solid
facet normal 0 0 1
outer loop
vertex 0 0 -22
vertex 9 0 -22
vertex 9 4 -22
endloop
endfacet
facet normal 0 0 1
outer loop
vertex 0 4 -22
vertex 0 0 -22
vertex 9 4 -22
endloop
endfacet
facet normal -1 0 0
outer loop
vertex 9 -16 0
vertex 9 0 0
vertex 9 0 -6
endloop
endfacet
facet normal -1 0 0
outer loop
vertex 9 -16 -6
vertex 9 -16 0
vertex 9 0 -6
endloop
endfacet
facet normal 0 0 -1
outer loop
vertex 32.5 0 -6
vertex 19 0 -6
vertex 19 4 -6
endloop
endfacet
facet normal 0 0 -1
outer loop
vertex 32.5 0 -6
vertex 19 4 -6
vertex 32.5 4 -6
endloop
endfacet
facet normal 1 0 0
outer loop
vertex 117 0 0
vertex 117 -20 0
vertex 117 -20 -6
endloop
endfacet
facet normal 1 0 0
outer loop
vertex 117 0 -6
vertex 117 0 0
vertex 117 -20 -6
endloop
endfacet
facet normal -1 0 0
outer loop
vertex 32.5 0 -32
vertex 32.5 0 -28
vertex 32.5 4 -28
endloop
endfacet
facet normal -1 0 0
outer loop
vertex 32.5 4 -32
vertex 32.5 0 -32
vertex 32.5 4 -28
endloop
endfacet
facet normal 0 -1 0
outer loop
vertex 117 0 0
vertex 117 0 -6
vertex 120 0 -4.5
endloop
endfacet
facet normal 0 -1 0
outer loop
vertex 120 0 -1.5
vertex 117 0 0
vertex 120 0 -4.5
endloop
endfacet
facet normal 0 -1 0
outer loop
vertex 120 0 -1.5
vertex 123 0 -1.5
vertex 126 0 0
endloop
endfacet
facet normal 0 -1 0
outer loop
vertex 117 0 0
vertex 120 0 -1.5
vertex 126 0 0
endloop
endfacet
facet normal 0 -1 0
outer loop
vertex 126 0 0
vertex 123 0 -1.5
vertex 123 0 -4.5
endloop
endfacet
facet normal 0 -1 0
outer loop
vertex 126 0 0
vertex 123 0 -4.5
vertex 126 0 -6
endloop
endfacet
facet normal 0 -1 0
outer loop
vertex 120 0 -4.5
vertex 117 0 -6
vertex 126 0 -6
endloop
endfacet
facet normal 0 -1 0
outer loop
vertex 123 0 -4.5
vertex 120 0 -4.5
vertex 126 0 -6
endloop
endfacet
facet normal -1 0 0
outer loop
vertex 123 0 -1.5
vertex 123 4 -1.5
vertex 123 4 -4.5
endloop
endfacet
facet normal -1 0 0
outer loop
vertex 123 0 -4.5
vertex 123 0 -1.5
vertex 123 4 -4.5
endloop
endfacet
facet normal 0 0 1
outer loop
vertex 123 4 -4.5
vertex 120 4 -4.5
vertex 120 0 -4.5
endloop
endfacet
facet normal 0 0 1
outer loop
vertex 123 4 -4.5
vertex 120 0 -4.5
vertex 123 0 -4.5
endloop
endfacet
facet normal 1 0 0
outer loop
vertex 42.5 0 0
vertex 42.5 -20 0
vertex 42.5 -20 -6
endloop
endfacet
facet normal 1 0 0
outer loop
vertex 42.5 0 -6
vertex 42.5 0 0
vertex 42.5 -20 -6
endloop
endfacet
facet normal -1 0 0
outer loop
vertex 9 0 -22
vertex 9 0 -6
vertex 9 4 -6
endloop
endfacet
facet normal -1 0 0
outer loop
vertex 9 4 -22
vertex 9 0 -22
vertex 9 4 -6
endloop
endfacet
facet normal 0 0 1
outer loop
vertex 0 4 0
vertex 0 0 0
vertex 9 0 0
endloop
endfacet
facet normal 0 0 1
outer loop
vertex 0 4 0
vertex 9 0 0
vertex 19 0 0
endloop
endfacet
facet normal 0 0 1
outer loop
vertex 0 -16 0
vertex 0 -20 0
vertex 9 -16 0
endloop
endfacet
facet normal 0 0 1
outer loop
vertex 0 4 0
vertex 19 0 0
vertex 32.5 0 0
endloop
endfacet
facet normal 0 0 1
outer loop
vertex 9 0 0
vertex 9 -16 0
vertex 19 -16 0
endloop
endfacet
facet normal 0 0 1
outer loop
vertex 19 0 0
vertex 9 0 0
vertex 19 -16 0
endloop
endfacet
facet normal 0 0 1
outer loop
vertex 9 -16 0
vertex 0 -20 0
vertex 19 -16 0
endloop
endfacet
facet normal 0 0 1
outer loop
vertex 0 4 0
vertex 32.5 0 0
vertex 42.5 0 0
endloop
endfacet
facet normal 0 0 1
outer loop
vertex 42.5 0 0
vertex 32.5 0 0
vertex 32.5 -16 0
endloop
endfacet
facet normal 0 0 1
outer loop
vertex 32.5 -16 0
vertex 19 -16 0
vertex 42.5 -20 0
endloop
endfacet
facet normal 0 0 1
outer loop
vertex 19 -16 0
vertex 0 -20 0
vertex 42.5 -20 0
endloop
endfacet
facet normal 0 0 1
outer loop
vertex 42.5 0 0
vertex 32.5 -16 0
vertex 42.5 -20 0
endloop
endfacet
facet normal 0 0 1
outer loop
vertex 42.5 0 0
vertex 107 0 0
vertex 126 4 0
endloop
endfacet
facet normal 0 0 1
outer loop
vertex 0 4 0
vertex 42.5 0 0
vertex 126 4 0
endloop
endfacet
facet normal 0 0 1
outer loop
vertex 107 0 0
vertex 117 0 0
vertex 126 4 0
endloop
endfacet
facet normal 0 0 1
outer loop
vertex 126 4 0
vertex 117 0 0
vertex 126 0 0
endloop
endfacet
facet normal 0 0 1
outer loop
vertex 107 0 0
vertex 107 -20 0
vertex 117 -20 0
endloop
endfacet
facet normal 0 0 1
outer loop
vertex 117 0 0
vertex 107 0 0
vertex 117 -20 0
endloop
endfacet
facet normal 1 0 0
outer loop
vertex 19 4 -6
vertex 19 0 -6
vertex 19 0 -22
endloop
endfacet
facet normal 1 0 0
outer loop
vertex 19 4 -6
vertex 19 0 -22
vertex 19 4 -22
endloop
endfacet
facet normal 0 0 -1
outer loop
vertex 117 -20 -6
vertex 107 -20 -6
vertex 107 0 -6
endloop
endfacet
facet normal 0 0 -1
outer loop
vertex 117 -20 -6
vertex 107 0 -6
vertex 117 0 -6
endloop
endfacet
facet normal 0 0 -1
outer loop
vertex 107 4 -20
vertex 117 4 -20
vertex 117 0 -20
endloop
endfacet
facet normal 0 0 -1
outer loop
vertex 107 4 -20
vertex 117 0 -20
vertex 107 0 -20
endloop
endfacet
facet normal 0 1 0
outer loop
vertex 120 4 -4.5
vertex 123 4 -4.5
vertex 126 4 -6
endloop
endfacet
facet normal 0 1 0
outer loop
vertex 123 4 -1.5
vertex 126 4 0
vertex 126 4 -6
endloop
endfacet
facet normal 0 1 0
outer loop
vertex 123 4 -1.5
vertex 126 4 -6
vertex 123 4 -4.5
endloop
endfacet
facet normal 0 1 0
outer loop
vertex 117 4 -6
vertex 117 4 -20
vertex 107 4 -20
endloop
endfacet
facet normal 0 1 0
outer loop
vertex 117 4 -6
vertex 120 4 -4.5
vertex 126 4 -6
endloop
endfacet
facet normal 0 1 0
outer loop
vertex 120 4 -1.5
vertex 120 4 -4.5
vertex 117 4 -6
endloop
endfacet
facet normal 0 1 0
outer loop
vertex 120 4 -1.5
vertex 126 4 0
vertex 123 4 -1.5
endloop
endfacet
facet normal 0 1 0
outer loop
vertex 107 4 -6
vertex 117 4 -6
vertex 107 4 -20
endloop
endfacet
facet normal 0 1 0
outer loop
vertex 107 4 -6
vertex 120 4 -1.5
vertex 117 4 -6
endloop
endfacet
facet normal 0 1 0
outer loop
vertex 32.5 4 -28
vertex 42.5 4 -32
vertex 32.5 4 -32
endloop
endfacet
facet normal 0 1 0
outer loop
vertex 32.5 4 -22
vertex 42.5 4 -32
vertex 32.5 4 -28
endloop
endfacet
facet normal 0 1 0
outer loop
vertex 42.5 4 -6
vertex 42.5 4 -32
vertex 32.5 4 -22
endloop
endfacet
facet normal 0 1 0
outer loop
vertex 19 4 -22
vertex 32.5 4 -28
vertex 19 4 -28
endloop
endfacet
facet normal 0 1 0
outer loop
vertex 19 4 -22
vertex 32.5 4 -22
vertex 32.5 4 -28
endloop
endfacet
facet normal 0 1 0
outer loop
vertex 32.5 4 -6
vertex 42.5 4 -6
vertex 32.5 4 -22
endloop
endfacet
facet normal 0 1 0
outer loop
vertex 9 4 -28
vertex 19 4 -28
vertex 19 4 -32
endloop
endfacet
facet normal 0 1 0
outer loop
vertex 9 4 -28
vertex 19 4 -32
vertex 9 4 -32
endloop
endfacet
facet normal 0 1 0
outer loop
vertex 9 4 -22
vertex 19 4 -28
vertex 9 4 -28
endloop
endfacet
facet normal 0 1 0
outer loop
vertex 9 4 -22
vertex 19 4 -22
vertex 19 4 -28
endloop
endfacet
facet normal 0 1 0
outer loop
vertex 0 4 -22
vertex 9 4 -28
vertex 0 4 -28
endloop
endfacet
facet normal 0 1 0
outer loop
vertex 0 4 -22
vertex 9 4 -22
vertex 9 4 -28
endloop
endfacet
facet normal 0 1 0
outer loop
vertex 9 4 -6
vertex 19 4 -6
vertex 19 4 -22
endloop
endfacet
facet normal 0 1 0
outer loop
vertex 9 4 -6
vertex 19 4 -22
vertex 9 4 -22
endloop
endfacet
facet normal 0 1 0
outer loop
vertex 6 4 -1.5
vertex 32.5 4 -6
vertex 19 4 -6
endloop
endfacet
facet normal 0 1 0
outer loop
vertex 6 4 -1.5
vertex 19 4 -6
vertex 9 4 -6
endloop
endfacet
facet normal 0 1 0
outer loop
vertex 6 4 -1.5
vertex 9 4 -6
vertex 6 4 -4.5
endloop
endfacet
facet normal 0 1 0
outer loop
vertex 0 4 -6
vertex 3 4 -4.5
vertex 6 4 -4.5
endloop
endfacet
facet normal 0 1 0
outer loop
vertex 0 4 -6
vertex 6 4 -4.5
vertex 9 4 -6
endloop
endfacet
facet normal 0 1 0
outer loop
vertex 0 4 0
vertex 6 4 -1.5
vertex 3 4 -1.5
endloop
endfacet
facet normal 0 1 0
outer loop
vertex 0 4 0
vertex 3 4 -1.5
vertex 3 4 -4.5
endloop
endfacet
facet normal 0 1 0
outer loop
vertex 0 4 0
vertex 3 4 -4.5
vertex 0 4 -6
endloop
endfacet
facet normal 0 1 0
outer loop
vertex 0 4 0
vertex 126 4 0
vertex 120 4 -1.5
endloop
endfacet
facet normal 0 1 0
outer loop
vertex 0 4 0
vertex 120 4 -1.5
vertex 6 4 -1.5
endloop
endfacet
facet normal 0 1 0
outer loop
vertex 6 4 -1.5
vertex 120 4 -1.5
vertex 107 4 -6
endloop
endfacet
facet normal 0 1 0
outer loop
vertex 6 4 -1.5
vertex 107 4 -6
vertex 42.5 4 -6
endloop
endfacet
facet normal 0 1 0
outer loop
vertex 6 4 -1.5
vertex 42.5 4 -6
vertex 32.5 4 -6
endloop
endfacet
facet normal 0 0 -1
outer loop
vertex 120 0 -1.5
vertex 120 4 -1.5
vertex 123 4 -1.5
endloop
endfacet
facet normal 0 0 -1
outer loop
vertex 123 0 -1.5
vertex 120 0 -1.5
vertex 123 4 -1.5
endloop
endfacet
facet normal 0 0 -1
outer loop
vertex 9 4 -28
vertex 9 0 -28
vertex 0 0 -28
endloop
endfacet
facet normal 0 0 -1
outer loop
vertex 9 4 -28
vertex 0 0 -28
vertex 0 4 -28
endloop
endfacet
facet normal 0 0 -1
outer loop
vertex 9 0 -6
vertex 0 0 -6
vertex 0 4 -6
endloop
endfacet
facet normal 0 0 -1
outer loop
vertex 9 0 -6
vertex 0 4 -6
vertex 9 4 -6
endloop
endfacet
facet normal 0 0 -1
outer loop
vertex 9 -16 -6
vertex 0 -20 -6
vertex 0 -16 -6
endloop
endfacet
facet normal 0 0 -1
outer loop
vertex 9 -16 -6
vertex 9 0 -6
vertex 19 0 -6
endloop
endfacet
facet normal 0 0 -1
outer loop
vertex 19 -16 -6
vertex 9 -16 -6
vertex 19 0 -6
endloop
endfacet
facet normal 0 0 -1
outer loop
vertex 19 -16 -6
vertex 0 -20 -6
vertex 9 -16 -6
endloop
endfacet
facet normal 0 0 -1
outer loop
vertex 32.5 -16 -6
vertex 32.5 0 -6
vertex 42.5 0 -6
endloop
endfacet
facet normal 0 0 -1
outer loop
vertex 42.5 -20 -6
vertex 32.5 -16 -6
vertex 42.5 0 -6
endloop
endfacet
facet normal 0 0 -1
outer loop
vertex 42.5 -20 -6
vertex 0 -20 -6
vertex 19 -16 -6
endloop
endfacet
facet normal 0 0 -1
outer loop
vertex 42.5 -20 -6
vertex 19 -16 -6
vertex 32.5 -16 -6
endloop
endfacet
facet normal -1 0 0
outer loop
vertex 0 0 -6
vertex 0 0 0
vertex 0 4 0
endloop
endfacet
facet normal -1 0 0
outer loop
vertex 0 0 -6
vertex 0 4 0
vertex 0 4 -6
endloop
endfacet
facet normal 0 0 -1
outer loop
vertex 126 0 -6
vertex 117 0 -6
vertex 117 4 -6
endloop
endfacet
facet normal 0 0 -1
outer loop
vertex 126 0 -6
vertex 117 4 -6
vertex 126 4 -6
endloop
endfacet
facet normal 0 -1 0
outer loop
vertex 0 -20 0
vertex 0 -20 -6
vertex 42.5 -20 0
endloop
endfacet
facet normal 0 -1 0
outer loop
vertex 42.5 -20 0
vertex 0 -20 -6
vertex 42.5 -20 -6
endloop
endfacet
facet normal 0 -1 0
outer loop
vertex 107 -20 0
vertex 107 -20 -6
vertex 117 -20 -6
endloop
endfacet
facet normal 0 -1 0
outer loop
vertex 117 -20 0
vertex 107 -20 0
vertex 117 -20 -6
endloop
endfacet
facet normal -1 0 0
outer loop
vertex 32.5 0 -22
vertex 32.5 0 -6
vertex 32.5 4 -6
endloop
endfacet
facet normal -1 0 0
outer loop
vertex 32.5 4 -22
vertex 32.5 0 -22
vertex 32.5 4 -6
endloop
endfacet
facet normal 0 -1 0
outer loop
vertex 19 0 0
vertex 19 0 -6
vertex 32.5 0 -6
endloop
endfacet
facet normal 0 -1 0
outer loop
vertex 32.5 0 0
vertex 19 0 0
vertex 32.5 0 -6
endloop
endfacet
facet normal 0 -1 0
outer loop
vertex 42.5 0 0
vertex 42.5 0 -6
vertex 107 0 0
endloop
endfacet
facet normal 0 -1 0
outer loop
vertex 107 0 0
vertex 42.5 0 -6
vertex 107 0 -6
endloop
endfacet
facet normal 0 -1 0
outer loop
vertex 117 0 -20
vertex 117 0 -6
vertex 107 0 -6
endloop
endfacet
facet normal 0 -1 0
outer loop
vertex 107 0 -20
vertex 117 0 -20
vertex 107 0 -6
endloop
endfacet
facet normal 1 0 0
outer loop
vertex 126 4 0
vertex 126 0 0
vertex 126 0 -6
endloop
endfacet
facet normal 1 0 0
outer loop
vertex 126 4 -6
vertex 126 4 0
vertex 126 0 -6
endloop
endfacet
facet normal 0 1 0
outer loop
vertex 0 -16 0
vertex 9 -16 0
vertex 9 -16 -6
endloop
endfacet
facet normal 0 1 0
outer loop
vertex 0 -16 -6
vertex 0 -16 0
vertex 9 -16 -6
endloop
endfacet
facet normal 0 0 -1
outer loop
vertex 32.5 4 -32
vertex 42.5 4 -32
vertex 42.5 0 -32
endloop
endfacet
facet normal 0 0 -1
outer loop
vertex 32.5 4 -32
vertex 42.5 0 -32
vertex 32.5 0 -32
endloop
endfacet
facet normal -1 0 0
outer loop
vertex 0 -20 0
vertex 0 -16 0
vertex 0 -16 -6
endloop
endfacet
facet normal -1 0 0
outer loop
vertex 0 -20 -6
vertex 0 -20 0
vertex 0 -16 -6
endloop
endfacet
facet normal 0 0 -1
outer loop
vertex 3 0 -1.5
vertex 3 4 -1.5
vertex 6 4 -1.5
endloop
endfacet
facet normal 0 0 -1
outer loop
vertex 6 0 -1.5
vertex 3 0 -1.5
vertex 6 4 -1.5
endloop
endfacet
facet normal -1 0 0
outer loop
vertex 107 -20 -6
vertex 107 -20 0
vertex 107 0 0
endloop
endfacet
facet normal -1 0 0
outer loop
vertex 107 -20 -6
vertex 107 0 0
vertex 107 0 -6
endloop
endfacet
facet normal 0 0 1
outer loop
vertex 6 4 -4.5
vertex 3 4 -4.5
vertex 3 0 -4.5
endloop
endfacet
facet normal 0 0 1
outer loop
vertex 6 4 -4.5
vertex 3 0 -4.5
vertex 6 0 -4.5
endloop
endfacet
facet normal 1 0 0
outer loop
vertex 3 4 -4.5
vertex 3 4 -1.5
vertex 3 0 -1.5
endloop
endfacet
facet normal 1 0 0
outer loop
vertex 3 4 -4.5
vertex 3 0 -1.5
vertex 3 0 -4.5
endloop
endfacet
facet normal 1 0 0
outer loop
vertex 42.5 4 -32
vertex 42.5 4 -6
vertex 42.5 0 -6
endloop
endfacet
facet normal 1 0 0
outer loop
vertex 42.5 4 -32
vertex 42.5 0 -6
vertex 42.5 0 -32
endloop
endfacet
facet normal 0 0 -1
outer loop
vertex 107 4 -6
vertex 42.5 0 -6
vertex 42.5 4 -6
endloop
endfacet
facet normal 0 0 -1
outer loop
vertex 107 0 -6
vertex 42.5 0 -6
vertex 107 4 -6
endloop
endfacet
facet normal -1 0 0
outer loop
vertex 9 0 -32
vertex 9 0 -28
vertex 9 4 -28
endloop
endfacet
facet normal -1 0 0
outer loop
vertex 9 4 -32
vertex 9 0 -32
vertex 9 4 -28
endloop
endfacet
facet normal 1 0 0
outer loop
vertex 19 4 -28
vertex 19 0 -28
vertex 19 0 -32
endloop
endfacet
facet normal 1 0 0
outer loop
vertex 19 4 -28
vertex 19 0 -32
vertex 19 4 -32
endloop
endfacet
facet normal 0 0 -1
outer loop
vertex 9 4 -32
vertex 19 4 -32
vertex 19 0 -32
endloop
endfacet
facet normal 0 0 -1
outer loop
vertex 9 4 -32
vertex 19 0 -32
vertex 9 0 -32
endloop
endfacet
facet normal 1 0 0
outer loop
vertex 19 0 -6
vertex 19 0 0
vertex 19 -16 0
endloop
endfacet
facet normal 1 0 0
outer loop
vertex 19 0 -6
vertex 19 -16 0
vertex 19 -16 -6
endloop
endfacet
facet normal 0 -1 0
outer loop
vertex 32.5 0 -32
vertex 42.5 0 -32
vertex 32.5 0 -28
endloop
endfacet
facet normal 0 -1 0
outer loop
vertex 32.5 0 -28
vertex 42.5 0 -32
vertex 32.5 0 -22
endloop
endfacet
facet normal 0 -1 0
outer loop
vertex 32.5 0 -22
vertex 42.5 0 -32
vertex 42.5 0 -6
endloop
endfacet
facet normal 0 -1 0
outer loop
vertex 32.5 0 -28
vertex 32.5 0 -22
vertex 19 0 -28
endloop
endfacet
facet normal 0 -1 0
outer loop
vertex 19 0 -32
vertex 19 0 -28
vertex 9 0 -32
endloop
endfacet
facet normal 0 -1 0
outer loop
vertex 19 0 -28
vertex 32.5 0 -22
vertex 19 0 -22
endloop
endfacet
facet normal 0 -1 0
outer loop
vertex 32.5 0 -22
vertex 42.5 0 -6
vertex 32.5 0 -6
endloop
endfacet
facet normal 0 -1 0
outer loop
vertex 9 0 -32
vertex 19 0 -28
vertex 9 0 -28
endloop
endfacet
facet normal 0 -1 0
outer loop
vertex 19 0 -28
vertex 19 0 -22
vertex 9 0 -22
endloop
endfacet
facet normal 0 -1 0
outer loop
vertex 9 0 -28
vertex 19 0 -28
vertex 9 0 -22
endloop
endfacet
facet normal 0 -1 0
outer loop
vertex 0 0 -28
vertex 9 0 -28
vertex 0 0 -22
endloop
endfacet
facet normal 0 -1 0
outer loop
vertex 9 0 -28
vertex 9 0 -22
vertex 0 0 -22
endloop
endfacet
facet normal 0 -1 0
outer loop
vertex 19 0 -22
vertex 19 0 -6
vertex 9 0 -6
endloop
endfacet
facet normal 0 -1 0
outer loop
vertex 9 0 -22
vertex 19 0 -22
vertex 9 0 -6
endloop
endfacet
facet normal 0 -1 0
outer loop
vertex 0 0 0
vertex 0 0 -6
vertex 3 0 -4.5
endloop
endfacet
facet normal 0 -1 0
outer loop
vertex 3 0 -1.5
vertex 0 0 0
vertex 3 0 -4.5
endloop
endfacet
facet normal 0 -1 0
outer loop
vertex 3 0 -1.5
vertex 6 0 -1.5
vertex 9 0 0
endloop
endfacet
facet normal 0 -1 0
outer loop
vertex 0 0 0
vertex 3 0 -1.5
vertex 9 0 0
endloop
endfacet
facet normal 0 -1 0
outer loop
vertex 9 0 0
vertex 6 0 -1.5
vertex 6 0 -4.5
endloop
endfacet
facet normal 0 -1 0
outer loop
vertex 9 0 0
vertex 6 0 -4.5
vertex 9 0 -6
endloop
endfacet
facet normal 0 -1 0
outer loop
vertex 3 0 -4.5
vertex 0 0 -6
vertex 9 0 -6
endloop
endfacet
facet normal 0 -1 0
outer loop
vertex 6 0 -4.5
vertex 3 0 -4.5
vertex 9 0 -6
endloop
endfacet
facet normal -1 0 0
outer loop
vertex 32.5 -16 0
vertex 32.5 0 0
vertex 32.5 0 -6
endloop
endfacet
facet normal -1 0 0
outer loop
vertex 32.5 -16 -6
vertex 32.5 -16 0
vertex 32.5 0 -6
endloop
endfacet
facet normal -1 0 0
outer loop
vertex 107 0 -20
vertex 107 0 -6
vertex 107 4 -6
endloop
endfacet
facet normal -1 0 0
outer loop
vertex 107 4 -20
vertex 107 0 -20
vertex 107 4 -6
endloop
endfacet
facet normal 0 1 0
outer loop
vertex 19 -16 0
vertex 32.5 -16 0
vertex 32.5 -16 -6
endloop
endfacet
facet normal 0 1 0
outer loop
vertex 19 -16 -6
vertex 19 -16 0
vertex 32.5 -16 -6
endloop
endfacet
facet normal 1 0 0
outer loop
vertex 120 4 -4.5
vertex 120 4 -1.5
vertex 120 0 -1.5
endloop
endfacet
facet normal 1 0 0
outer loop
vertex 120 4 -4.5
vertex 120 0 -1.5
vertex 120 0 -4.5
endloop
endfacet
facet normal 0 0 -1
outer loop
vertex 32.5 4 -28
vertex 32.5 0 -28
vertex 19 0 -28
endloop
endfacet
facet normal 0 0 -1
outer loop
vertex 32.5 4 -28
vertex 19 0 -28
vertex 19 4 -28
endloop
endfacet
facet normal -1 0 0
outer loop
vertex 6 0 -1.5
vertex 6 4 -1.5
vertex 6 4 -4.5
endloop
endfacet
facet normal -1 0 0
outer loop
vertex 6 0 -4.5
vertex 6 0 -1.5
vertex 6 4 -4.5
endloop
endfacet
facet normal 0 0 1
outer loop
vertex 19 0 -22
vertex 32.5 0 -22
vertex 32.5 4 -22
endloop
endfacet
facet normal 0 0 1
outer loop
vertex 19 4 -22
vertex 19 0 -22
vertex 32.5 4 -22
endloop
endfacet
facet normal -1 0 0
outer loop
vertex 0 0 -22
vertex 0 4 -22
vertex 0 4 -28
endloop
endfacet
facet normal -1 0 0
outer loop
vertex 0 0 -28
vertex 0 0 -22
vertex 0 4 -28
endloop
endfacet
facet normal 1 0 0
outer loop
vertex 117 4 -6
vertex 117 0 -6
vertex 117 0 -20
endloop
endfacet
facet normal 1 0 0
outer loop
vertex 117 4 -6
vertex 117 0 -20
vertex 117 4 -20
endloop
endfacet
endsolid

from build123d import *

# Parameters (mm, degrees)
SKETCH1_W           = 126
SKETCH1_H           = 6
BOSS_EXTRUDE1_DEPTH = 4
SKETCH2_W           = 3
SKETCH2_H           = 3
CUT_EXTRUDE1_DEPTH  = 4
SKETCH3_W           = 10
SKETCH3_H           = 6
BOSS_EXTRUDE2_DEPTH = 20
SKETCH4_W           = 10
SKETCH4_H           = 4
BOSS_EXTRUDE3_DEPTH = 26
SKETCH5_W           = 6
SKETCH5_H           = 4
BOSS_EXTRUDE4_DEPTH = 42.5
SKETCH6_W           = 10
SKETCH6_H           = 4
BOSS_EXTRUDE5_DEPTH = 14


with BuildPart() as part:
    # Sketch1 → Boss-Extrude1 (new body)
    with BuildSketch(Plane(origin=(0, 0, 0), x_dir=(1, 0, 0), z_dir=(0, 1, 0))):
        with Locations((63, 3)):
            Rectangle(SKETCH1_W, SKETCH1_H)
    extrude(amount=BOSS_EXTRUDE1_DEPTH)

    # Sketch2 → Cut-Extrude1 (cut)
    with BuildSketch(Plane(origin=(0, 4, 0), x_dir=(1, 0, 0), z_dir=(0, 1, 0))):
        with Locations((121.5, 3)):
            Rectangle(SKETCH2_W, SKETCH2_H)
        with Locations((4.5, 3)):
            Rectangle(SKETCH2_W, SKETCH2_H)
    extrude(amount=-CUT_EXTRUDE1_DEPTH, mode=Mode.SUBTRACT)

    # Sketch3 → Boss-Extrude2 (add)
    with BuildSketch(Plane(origin=(0, 0, 0), x_dir=(1, 0, 0), z_dir=(0, 1, 0))):
        with Locations((14, 3)):
            Rectangle(SKETCH3_W, SKETCH3_H)
        with Locations((112, 3)):
            Rectangle(SKETCH3_W, SKETCH3_H)
        with Locations((37.5, 3)):
            Rectangle(SKETCH3_W, SKETCH3_H)
    extrude(amount=-BOSS_EXTRUDE2_DEPTH)

    # Sketch4 → Boss-Extrude3 (add)
    with BuildSketch(Plane(origin=(0, 0, -6), x_dir=(-1, 0, 0), z_dir=(0, 0, -1))):
        with Locations((-14, 2)):
            Rectangle(SKETCH4_W, SKETCH4_H)
        with Locations((-37.5, 2)):
            Rectangle(SKETCH4_W, SKETCH4_H)
    extrude(amount=BOSS_EXTRUDE3_DEPTH)

    # Sketch5 → Boss-Extrude4 (add)
    with BuildSketch(Plane(origin=(42.5, 0, 0), x_dir=(0, 0, -1), z_dir=(1, 0, 0))):
        with Locations((25, 2)):
            Rectangle(SKETCH5_W, SKETCH5_H)
        with Locations((3, -18)):
            Rectangle(SKETCH5_W, SKETCH5_H)
    extrude(amount=-BOSS_EXTRUDE4_DEPTH)

    # Sketch6 → Boss-Extrude5 (add)
    with BuildSketch(Plane(origin=(0, 0, -6), x_dir=(-1, 0, 0), z_dir=(0, 0, -1))):
        with Locations((-112, 2)):
            Rectangle(SKETCH6_W, SKETCH6_H)
    extrude(amount=BOSS_EXTRUDE5_DEPTH)


solid = part.part
